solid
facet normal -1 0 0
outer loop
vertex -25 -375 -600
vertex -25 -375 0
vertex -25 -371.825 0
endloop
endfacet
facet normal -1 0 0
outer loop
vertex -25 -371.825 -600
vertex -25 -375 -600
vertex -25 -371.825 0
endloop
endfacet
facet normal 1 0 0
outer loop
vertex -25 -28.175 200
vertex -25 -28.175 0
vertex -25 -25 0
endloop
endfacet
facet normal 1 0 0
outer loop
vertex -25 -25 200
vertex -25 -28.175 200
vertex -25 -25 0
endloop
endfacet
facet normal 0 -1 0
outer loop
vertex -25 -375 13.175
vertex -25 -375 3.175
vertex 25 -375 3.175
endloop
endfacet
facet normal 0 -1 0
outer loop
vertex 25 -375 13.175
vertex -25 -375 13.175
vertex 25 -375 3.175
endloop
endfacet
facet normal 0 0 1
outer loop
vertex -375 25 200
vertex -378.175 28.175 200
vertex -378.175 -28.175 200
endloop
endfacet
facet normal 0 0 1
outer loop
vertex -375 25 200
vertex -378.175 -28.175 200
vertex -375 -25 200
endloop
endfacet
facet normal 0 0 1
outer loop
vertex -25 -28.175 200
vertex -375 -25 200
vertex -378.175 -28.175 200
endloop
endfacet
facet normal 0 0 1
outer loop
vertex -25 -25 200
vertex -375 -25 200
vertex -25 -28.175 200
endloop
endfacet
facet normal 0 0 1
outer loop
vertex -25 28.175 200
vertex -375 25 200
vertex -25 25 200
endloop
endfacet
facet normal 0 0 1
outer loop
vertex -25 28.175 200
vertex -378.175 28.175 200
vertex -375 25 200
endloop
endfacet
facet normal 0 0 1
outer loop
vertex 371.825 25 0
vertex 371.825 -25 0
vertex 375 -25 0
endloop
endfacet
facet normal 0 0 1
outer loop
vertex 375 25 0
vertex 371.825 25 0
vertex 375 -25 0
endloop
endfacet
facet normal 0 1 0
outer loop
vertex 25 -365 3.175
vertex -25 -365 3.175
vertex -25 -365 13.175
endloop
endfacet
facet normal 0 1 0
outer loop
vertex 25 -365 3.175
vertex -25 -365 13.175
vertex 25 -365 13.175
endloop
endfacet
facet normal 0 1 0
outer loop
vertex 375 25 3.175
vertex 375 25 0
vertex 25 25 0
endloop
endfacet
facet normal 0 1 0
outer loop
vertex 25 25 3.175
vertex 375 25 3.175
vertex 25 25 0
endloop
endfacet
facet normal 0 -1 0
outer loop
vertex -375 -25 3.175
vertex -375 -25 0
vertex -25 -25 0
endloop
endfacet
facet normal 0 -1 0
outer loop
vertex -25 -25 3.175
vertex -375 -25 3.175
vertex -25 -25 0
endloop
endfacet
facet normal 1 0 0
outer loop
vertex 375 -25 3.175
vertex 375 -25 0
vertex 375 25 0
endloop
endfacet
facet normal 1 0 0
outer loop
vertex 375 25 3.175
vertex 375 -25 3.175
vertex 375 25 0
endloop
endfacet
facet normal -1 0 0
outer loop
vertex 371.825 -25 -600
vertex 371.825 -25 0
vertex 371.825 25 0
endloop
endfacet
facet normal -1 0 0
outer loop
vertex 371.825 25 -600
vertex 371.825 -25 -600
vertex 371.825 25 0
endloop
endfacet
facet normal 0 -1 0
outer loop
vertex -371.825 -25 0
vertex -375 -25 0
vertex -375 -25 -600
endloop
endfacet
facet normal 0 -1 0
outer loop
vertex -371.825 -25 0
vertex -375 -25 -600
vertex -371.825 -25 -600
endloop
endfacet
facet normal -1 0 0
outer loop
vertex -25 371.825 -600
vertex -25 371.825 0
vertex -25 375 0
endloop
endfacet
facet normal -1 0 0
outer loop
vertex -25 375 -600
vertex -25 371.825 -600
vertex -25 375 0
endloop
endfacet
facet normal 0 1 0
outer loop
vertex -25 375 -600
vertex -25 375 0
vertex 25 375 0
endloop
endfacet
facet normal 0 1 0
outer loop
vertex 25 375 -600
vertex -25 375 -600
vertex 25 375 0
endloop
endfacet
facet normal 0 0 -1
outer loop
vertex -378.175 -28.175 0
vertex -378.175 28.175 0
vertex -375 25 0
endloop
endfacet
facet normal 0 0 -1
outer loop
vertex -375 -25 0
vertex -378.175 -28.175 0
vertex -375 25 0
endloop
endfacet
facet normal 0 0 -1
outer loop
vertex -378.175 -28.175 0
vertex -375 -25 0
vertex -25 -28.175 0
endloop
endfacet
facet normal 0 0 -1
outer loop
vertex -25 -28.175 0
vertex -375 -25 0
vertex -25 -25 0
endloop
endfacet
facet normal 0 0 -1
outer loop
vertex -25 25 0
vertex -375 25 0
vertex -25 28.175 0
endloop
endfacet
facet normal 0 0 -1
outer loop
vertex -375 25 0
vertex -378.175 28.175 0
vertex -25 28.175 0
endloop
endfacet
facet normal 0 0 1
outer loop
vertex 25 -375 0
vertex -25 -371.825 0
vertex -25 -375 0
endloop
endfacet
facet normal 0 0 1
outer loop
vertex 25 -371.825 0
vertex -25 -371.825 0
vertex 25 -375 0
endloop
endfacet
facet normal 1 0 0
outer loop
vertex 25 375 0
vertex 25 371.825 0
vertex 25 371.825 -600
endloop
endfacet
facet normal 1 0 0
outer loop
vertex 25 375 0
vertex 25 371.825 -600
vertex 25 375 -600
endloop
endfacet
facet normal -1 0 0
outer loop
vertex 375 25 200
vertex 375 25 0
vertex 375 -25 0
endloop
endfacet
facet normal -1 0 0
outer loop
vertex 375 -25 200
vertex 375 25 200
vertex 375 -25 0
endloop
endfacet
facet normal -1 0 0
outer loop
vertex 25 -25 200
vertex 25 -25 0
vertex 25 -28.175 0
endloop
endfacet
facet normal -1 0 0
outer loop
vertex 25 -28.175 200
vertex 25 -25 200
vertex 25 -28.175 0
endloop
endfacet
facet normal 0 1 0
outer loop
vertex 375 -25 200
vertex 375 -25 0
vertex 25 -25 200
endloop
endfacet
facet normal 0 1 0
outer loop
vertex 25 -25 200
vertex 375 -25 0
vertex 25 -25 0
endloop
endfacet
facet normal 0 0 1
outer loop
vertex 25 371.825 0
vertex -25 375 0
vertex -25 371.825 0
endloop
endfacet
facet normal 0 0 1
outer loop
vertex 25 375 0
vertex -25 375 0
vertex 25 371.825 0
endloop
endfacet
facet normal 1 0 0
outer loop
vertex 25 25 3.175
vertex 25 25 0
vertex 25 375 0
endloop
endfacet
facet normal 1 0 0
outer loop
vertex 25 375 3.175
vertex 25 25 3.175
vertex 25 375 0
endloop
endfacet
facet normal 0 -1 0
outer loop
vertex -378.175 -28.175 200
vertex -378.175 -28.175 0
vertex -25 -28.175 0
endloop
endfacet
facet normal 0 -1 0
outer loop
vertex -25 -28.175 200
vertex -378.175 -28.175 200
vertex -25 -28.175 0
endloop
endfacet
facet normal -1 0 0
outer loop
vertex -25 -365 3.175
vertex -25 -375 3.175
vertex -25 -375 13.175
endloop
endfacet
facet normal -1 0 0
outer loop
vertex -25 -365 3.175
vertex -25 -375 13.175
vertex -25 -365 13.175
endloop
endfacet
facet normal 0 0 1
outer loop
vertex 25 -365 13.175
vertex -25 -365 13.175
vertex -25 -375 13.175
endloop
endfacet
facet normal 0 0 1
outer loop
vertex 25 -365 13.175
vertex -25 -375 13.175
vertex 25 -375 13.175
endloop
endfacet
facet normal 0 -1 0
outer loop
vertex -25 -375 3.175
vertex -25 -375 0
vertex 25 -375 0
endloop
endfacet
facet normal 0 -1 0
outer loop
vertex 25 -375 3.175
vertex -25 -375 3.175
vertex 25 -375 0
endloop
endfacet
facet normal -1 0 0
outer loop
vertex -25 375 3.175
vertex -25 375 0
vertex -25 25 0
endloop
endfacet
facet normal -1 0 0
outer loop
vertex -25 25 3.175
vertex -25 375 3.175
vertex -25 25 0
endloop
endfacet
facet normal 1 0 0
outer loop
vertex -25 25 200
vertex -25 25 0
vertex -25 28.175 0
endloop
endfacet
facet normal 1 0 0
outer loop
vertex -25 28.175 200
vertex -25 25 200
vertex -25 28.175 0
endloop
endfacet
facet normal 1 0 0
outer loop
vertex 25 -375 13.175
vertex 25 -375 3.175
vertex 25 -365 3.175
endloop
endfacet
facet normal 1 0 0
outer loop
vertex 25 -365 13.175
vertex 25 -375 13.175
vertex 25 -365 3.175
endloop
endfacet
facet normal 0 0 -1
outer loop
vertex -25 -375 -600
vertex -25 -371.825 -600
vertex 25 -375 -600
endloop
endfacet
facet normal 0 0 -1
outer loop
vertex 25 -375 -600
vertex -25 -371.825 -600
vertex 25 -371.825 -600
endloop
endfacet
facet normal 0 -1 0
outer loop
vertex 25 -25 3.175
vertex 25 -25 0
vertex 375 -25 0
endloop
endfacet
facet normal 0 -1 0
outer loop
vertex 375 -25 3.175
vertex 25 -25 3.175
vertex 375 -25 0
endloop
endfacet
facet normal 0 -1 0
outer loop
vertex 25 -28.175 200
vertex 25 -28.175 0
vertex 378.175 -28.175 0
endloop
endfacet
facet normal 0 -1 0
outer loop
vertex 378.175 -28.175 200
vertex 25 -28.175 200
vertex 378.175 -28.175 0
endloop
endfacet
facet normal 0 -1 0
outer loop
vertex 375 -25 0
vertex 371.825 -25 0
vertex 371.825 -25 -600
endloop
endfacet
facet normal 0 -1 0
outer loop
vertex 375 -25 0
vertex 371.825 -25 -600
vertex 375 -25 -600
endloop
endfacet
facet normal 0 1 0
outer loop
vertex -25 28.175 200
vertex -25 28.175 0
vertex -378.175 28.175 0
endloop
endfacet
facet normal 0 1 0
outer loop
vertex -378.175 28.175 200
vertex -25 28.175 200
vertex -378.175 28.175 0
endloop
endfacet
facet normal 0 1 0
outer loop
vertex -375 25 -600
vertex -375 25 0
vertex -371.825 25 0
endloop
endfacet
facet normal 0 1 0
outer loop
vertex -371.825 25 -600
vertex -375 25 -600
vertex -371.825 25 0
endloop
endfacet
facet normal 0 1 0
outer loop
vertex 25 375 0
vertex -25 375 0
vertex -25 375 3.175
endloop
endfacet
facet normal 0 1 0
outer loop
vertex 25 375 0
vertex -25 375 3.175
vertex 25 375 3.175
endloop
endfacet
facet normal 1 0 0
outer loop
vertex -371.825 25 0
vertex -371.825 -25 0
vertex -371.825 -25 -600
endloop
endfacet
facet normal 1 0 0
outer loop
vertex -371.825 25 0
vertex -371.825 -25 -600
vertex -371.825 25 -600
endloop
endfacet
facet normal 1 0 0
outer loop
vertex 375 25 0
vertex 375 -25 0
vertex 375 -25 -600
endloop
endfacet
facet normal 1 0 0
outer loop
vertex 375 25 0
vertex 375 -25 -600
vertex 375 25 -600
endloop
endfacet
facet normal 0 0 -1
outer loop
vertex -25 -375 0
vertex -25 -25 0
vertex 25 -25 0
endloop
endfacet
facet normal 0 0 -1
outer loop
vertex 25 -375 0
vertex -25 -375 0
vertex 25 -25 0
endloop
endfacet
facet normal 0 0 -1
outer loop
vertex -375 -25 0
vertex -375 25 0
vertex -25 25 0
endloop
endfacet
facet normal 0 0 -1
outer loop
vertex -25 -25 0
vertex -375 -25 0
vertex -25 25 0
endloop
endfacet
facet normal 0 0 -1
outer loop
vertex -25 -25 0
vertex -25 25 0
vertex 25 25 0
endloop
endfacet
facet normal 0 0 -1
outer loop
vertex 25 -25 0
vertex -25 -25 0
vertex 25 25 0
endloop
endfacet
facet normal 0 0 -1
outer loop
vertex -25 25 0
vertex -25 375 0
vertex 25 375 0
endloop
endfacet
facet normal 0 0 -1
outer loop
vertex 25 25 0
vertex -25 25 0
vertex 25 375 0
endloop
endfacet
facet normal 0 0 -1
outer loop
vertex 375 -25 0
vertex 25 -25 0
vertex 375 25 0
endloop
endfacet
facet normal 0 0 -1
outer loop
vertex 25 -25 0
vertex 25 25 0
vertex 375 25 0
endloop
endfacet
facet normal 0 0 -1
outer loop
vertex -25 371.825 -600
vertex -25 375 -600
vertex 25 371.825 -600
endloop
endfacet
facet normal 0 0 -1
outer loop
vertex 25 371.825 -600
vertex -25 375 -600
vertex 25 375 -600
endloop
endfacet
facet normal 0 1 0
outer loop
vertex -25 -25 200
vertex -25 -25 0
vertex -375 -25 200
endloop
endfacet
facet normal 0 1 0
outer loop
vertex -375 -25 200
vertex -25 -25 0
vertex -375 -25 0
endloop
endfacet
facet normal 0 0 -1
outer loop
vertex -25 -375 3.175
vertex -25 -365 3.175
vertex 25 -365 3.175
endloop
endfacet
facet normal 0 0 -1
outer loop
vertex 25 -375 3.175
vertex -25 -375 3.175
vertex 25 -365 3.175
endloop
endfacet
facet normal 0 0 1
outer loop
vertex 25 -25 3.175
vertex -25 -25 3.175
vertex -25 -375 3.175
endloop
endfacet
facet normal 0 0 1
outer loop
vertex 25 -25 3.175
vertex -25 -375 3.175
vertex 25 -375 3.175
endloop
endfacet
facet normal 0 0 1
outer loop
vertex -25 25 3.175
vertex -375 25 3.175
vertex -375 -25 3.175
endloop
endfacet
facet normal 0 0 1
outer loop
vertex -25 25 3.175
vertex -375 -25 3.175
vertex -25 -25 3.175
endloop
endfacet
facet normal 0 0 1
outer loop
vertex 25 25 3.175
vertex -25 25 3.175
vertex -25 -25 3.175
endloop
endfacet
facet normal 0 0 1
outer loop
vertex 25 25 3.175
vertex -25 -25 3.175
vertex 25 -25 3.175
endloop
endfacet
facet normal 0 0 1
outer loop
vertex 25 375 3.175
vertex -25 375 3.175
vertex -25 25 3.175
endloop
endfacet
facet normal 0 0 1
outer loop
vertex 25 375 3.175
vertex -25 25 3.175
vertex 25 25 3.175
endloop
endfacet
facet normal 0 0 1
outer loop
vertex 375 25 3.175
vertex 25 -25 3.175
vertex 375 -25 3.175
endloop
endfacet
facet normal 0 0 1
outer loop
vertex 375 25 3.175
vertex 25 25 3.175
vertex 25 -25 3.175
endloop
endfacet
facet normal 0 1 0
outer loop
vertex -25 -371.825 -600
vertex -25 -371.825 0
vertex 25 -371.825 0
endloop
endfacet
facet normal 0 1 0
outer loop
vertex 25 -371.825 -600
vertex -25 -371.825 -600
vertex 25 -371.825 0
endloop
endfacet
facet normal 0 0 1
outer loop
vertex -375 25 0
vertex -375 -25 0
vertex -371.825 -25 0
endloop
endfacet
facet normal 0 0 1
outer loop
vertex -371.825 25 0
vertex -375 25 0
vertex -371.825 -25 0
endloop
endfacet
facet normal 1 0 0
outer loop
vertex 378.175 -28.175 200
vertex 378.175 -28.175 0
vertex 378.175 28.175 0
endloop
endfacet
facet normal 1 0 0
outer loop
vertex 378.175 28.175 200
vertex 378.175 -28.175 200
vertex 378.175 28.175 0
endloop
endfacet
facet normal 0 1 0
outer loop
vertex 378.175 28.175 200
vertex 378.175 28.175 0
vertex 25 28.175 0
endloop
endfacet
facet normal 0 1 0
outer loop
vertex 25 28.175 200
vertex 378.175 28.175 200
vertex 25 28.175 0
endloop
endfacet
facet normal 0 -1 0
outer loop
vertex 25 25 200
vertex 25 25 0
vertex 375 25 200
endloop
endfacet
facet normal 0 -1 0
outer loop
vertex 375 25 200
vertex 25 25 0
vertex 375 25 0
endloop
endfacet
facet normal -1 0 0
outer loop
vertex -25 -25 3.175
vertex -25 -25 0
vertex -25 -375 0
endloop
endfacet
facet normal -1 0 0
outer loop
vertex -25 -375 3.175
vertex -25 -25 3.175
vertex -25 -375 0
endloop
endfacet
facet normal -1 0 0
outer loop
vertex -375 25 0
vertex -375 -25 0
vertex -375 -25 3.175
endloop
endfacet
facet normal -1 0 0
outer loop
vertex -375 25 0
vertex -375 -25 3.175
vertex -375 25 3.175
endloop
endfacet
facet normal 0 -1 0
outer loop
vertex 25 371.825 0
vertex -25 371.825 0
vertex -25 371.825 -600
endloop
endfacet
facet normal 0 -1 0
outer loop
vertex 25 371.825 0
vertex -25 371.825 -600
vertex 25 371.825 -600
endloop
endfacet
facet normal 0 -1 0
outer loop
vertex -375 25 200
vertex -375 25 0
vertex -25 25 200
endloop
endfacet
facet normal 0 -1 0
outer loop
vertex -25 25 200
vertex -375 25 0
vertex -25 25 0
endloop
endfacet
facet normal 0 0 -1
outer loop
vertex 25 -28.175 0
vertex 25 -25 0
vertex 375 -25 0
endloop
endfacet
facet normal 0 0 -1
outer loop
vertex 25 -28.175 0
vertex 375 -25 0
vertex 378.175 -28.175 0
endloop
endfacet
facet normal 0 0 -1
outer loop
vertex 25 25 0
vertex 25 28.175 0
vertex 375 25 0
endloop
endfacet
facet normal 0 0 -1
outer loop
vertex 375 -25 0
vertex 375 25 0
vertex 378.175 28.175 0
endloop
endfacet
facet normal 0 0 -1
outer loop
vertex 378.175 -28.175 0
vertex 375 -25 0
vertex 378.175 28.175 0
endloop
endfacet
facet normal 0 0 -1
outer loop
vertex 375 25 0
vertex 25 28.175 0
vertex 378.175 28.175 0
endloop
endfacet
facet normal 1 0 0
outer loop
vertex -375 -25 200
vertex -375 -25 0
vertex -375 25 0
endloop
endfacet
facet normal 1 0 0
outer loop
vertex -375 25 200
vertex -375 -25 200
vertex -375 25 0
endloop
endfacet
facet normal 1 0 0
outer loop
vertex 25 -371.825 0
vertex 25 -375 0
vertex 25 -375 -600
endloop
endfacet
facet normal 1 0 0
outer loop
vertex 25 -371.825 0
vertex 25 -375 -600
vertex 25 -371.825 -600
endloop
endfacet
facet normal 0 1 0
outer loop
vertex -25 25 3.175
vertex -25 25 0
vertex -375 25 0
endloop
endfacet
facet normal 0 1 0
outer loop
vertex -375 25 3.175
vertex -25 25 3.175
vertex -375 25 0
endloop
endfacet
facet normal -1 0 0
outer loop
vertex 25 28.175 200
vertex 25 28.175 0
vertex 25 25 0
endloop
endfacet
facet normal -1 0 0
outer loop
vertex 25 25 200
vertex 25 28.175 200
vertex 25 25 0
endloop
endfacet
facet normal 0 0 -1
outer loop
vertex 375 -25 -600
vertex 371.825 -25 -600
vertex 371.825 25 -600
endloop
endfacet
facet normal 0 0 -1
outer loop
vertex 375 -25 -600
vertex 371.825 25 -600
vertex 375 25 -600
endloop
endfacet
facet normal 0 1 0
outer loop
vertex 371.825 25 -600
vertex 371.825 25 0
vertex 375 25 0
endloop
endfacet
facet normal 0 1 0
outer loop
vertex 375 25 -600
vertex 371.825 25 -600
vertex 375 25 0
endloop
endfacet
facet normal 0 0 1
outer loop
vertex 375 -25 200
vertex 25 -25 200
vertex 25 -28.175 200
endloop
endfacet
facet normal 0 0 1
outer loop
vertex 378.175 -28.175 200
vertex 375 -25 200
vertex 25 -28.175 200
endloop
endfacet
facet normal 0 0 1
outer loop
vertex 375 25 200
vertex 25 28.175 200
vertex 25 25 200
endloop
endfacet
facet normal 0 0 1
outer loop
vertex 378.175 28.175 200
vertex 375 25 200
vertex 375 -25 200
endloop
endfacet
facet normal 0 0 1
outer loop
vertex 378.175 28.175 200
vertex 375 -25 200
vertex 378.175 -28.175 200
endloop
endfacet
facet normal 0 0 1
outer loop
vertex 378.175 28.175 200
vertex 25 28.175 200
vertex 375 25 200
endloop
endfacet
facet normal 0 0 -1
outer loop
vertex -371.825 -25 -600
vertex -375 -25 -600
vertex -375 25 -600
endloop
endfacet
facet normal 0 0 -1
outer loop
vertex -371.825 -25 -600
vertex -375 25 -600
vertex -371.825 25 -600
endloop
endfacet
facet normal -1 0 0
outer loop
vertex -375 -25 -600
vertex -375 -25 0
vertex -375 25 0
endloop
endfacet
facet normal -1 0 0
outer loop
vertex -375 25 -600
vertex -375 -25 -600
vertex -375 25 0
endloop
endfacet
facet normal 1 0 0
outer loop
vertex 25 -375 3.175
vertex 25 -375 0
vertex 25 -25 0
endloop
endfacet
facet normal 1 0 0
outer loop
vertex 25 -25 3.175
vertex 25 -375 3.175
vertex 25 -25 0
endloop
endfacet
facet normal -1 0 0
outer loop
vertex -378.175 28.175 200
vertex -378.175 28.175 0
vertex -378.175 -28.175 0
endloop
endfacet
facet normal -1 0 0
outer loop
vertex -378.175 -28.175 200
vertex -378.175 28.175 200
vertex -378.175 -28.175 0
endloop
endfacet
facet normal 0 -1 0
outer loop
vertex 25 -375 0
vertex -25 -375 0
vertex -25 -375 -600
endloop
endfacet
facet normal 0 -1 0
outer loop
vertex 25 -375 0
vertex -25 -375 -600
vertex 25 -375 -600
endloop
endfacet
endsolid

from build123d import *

# Parameters (mm, degrees)
F1_DEPTH = 200
F0_W     = 50
F0_H     = 50
F0_W_2   = 43.65
F0_H_2   = 43.65
F0_H_3   = 6.825
F0_W_3   = 346.825
F0_W_4   = 3.175
F0_H_4   = 3.175
F2_DEPTH = 3.175
F3_W     = 50
F3_H     = 10
F4_DEPTH = 10
F5_DEPTH = 600


# Not quite as in the source:
# - a length typed as a fraction of an inch, garbled in the dataset ("3 / 203.2 mm" for 3/8 in), is restored


with BuildPart() as f1:
    # F0 (on Top) → F1 (new body)
    with BuildSketch(Plane.XY):
        Polygon((-371.825, 25), (-25, 25), (-25, 28.175), (-378.175, 28.175), (-378.175, -28.175), (-25, -28.175), (-25, -25), (-371.825, -25), (-375, -25), (-375, 25), align=None)
    extrude(amount=F1_DEPTH)


with BuildPart() as f1b:
    # F0 (on Top) → F1, piece 2 (new body)
    with BuildSketch(Plane.XY):
        Polygon((371.825, 25), (375, 25), (375, -25), (371.825, -25), (25, -25), (25, -28.175), (378.175, -28.175), (378.175, 28.175), (25, 28.175), (25, 25), align=None)
    extrude(amount=F1_DEPTH)


with BuildPart() as f2:
    # F0 (on Top) → F2 (new body)
    with BuildSketch(Plane.XY):
        Rectangle(F0_W, F0_H)
        Rectangle(F0_W_2, F0_H_2, mode=Mode.SUBTRACT)
        Polygon((25, -28.175), (25, -25), (-25, -25), (-25, -28.175), (-25, -365), (25, -365), align=None)
        with Locations((0, -368.4125)):
            Rectangle(F0_W, F0_H_3)
        with Locations((-198.4125, 0)):
            Rectangle(F0_W_3, F0_H)
        Rectangle(F0_W_2, F0_H_2)
        with Locations((198.4125, 0)):
            Rectangle(F0_W_3, F0_H)
        Polygon((-25, 25), (25, 25), (25, 28.175), (25, 371.825), (-25, 371.825), (-25, 28.175), align=None)
        with Locations((-373.4125, 0)):
            Rectangle(F0_W_4, F0_H)
        with Locations((373.4125, 0)):
            Rectangle(F0_W_4, F0_H)
        with Locations((0, 373.4125)):
            Rectangle(F0_W, F0_H_4)
        with Locations((0, -373.4125)):
            Rectangle(F0_W, F0_H_4)
    extrude(amount=F2_DEPTH)


with BuildPart() as f4:
    # F3 (on face) → F4 (new body)
    with BuildSketch(Plane.XY.offset(3.175)):
        with Locations((0, -370)):
            Rectangle(F3_W, F3_H)
    extrude(amount=F4_DEPTH)


with BuildPart() as f5:
    # F0 (on Top) → F5 (new body)
    with BuildSketch(Plane.XY):
        with Locations((0, 373.4125)):
            Rectangle(F0_W, F0_H_4)
    extrude(amount=-F5_DEPTH)


with BuildPart() as f5b:
    # F0 (on Top) → F5, piece 2 (new body)
    with BuildSketch(Plane.XY):
        with Locations((-373.4125, 0)):
            Rectangle(F0_W_4, F0_H)
    extrude(amount=-F5_DEPTH)


with BuildPart() as f5c:
    # F0 (on Top) → F5, piece 3 (new body)
    with BuildSketch(Plane.XY):
        with Locations((373.4125, 0)):
            Rectangle(F0_W_4, F0_H)
    extrude(amount=-F5_DEPTH)


with BuildPart() as f5d:
    # F0 (on Top) → F5, piece 4 (new body)
    with BuildSketch(Plane.XY):
        with Locations((0, -373.4125)):
            Rectangle(F0_W, F0_H_4)
    extrude(amount=-F5_DEPTH)


solid = Compound([f1.part, f1b.part, f2.part, f4.part, f5.part, f5b.part, f5c.part, f5d.part])
